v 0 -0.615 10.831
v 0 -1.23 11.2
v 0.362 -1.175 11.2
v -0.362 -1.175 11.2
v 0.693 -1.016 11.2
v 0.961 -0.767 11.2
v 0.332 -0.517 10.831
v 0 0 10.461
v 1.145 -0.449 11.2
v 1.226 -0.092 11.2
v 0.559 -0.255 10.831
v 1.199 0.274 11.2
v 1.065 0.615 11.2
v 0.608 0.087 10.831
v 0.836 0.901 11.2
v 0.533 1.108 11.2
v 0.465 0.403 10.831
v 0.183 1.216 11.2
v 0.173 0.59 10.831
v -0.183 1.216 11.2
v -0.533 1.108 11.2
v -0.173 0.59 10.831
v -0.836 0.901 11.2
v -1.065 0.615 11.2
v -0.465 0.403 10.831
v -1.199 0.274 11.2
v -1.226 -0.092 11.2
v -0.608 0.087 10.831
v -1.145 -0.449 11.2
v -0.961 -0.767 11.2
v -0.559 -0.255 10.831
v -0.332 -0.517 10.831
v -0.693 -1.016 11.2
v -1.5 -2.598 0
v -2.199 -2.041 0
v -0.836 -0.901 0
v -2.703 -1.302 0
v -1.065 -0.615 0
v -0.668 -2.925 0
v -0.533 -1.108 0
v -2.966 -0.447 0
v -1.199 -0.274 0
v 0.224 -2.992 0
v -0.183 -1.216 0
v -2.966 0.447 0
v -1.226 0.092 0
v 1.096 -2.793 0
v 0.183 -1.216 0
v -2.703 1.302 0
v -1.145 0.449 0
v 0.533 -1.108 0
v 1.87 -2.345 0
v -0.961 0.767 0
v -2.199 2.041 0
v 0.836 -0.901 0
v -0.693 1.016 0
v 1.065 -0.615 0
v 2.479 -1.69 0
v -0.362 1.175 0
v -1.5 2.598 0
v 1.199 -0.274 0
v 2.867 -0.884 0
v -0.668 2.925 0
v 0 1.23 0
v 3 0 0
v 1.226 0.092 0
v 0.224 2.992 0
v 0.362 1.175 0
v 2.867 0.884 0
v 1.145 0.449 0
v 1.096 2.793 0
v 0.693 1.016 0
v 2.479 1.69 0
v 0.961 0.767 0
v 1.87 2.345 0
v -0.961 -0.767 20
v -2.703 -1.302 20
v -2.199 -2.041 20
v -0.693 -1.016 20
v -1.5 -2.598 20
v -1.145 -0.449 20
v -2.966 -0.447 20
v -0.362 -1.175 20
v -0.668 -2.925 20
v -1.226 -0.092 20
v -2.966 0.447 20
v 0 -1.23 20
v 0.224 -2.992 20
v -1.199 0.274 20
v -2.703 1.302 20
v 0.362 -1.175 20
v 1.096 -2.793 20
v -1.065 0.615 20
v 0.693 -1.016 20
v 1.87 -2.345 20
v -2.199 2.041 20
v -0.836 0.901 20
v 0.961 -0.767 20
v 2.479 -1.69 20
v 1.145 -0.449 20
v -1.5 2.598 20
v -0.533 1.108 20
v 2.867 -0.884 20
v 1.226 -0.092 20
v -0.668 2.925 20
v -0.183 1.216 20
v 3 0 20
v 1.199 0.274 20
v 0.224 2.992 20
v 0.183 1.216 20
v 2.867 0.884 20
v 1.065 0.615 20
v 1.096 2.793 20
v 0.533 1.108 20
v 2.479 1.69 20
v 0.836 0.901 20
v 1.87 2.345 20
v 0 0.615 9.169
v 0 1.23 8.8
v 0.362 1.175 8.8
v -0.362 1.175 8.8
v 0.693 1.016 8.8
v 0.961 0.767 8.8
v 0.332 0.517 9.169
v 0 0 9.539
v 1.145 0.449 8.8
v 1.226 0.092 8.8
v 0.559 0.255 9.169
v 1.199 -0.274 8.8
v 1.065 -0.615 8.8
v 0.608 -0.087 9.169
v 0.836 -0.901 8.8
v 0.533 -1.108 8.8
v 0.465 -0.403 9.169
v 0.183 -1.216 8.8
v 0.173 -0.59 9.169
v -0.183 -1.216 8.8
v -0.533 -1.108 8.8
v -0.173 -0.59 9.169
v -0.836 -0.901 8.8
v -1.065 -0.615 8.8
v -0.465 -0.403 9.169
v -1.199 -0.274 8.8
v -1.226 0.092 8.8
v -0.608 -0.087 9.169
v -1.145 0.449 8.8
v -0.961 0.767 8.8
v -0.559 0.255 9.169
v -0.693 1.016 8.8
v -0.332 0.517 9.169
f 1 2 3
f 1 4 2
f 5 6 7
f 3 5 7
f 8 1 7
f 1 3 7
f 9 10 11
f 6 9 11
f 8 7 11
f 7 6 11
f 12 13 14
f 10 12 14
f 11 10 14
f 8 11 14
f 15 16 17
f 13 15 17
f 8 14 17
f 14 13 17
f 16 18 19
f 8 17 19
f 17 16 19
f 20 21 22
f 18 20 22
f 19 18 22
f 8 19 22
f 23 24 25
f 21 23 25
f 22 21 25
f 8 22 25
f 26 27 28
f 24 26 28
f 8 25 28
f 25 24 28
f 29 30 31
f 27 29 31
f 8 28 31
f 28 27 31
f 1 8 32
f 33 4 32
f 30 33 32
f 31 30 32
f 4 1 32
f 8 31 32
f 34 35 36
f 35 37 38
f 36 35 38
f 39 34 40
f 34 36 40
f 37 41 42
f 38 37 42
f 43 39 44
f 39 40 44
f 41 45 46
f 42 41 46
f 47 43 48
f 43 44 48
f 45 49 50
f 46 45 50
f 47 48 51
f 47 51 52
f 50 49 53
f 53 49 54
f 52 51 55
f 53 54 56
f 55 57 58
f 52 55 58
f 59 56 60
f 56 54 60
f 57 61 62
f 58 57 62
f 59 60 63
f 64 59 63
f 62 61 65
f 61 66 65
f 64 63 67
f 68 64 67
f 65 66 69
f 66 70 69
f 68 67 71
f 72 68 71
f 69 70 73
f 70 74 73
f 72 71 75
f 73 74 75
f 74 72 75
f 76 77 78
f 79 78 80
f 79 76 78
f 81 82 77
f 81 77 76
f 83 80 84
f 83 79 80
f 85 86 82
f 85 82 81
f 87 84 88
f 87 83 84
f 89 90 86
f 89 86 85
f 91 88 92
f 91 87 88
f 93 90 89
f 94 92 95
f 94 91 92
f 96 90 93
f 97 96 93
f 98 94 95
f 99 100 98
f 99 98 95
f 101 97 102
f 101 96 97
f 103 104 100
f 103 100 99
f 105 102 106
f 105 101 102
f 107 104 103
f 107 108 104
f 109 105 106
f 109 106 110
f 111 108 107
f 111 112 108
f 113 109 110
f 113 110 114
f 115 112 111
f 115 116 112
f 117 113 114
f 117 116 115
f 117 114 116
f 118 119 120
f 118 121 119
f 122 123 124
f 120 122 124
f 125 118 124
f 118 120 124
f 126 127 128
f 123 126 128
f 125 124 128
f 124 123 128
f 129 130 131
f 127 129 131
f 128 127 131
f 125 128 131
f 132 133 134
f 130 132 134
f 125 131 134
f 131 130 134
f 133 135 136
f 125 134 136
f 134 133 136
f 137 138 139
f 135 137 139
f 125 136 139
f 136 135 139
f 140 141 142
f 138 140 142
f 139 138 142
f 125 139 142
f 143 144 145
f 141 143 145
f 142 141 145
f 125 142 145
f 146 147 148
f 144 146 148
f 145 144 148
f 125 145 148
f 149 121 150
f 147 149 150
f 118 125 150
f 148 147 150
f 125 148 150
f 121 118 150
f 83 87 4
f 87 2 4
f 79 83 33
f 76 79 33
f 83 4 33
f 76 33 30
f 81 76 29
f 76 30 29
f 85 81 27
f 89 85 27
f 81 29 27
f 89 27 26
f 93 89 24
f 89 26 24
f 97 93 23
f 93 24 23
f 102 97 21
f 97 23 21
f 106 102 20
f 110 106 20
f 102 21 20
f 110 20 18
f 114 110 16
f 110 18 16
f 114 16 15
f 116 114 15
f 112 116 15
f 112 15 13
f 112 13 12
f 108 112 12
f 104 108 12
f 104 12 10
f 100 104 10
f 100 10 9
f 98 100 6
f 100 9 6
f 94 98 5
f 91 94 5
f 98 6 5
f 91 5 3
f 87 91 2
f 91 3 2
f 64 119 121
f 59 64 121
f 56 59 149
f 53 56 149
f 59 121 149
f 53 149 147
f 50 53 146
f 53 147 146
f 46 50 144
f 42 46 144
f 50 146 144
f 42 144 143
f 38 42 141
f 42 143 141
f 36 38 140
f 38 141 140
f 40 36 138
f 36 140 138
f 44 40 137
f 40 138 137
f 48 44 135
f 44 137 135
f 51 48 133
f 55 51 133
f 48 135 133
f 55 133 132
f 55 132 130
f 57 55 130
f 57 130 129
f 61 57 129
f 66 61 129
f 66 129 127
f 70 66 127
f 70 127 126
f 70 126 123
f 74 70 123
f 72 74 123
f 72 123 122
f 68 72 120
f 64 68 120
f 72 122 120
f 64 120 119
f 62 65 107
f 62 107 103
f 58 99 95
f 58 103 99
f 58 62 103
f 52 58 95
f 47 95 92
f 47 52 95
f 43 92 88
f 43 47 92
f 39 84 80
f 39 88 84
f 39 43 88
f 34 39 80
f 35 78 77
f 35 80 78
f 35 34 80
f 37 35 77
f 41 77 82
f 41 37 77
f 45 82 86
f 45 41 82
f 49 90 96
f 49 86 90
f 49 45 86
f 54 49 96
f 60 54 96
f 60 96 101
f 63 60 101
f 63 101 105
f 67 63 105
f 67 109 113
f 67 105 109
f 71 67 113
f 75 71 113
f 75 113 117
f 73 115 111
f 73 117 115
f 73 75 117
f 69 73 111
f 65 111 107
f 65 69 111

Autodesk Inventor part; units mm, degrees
ref_plane "YZ Plane" through (0, 0, 0) normal (1, 0, 0) x (0, 1, 0)
ref_plane "XZ Plane" through (0, 0, 0) normal (0, 1, 0) x (-1, 0, 0)
ref_plane "XY Plane" through (0, 0, 0) normal (0, 0, 1) x (1, 0, 0)
sketch "スケッチ1" plane through (0, 0, 0) normal (0, 0, 1) x (1, 0, 0)
  circle A0 centre (0, 0) radius 3
  dimension "d0" = 6
extrude "押し出し1" add sketch "スケッチ1" along normal blind 20
sketch "スケッチ2" plane through (0, 0, 20) normal (0, 0, 1) x (1, 0, 0)
  point P0 (0, 0)
  point P1 (0, 0)
hole "穴1" at (0, 0, 20) direction (0, 0, -1) diameter 2.459 depth 8.8 tip angle 118 thread size "M3x0.5" class "6H" standard "ISO Metric profile"
sketch "スケッチ3" plane through (0, 0, 0) normal (0, 0, -1) x (-1, 0, 0)
  circle A0 centre (0, 0) radius 1.2295 projected
hole "穴2" at (0, 0, 0) direction (0, 0, 1) diameter 2.459 depth 8.8 tip angle 118 thread size "M3x0.5" class "6H" standard "ISO Metric profile"
properties part number "base_part1" material "アルミニウム 6061"
